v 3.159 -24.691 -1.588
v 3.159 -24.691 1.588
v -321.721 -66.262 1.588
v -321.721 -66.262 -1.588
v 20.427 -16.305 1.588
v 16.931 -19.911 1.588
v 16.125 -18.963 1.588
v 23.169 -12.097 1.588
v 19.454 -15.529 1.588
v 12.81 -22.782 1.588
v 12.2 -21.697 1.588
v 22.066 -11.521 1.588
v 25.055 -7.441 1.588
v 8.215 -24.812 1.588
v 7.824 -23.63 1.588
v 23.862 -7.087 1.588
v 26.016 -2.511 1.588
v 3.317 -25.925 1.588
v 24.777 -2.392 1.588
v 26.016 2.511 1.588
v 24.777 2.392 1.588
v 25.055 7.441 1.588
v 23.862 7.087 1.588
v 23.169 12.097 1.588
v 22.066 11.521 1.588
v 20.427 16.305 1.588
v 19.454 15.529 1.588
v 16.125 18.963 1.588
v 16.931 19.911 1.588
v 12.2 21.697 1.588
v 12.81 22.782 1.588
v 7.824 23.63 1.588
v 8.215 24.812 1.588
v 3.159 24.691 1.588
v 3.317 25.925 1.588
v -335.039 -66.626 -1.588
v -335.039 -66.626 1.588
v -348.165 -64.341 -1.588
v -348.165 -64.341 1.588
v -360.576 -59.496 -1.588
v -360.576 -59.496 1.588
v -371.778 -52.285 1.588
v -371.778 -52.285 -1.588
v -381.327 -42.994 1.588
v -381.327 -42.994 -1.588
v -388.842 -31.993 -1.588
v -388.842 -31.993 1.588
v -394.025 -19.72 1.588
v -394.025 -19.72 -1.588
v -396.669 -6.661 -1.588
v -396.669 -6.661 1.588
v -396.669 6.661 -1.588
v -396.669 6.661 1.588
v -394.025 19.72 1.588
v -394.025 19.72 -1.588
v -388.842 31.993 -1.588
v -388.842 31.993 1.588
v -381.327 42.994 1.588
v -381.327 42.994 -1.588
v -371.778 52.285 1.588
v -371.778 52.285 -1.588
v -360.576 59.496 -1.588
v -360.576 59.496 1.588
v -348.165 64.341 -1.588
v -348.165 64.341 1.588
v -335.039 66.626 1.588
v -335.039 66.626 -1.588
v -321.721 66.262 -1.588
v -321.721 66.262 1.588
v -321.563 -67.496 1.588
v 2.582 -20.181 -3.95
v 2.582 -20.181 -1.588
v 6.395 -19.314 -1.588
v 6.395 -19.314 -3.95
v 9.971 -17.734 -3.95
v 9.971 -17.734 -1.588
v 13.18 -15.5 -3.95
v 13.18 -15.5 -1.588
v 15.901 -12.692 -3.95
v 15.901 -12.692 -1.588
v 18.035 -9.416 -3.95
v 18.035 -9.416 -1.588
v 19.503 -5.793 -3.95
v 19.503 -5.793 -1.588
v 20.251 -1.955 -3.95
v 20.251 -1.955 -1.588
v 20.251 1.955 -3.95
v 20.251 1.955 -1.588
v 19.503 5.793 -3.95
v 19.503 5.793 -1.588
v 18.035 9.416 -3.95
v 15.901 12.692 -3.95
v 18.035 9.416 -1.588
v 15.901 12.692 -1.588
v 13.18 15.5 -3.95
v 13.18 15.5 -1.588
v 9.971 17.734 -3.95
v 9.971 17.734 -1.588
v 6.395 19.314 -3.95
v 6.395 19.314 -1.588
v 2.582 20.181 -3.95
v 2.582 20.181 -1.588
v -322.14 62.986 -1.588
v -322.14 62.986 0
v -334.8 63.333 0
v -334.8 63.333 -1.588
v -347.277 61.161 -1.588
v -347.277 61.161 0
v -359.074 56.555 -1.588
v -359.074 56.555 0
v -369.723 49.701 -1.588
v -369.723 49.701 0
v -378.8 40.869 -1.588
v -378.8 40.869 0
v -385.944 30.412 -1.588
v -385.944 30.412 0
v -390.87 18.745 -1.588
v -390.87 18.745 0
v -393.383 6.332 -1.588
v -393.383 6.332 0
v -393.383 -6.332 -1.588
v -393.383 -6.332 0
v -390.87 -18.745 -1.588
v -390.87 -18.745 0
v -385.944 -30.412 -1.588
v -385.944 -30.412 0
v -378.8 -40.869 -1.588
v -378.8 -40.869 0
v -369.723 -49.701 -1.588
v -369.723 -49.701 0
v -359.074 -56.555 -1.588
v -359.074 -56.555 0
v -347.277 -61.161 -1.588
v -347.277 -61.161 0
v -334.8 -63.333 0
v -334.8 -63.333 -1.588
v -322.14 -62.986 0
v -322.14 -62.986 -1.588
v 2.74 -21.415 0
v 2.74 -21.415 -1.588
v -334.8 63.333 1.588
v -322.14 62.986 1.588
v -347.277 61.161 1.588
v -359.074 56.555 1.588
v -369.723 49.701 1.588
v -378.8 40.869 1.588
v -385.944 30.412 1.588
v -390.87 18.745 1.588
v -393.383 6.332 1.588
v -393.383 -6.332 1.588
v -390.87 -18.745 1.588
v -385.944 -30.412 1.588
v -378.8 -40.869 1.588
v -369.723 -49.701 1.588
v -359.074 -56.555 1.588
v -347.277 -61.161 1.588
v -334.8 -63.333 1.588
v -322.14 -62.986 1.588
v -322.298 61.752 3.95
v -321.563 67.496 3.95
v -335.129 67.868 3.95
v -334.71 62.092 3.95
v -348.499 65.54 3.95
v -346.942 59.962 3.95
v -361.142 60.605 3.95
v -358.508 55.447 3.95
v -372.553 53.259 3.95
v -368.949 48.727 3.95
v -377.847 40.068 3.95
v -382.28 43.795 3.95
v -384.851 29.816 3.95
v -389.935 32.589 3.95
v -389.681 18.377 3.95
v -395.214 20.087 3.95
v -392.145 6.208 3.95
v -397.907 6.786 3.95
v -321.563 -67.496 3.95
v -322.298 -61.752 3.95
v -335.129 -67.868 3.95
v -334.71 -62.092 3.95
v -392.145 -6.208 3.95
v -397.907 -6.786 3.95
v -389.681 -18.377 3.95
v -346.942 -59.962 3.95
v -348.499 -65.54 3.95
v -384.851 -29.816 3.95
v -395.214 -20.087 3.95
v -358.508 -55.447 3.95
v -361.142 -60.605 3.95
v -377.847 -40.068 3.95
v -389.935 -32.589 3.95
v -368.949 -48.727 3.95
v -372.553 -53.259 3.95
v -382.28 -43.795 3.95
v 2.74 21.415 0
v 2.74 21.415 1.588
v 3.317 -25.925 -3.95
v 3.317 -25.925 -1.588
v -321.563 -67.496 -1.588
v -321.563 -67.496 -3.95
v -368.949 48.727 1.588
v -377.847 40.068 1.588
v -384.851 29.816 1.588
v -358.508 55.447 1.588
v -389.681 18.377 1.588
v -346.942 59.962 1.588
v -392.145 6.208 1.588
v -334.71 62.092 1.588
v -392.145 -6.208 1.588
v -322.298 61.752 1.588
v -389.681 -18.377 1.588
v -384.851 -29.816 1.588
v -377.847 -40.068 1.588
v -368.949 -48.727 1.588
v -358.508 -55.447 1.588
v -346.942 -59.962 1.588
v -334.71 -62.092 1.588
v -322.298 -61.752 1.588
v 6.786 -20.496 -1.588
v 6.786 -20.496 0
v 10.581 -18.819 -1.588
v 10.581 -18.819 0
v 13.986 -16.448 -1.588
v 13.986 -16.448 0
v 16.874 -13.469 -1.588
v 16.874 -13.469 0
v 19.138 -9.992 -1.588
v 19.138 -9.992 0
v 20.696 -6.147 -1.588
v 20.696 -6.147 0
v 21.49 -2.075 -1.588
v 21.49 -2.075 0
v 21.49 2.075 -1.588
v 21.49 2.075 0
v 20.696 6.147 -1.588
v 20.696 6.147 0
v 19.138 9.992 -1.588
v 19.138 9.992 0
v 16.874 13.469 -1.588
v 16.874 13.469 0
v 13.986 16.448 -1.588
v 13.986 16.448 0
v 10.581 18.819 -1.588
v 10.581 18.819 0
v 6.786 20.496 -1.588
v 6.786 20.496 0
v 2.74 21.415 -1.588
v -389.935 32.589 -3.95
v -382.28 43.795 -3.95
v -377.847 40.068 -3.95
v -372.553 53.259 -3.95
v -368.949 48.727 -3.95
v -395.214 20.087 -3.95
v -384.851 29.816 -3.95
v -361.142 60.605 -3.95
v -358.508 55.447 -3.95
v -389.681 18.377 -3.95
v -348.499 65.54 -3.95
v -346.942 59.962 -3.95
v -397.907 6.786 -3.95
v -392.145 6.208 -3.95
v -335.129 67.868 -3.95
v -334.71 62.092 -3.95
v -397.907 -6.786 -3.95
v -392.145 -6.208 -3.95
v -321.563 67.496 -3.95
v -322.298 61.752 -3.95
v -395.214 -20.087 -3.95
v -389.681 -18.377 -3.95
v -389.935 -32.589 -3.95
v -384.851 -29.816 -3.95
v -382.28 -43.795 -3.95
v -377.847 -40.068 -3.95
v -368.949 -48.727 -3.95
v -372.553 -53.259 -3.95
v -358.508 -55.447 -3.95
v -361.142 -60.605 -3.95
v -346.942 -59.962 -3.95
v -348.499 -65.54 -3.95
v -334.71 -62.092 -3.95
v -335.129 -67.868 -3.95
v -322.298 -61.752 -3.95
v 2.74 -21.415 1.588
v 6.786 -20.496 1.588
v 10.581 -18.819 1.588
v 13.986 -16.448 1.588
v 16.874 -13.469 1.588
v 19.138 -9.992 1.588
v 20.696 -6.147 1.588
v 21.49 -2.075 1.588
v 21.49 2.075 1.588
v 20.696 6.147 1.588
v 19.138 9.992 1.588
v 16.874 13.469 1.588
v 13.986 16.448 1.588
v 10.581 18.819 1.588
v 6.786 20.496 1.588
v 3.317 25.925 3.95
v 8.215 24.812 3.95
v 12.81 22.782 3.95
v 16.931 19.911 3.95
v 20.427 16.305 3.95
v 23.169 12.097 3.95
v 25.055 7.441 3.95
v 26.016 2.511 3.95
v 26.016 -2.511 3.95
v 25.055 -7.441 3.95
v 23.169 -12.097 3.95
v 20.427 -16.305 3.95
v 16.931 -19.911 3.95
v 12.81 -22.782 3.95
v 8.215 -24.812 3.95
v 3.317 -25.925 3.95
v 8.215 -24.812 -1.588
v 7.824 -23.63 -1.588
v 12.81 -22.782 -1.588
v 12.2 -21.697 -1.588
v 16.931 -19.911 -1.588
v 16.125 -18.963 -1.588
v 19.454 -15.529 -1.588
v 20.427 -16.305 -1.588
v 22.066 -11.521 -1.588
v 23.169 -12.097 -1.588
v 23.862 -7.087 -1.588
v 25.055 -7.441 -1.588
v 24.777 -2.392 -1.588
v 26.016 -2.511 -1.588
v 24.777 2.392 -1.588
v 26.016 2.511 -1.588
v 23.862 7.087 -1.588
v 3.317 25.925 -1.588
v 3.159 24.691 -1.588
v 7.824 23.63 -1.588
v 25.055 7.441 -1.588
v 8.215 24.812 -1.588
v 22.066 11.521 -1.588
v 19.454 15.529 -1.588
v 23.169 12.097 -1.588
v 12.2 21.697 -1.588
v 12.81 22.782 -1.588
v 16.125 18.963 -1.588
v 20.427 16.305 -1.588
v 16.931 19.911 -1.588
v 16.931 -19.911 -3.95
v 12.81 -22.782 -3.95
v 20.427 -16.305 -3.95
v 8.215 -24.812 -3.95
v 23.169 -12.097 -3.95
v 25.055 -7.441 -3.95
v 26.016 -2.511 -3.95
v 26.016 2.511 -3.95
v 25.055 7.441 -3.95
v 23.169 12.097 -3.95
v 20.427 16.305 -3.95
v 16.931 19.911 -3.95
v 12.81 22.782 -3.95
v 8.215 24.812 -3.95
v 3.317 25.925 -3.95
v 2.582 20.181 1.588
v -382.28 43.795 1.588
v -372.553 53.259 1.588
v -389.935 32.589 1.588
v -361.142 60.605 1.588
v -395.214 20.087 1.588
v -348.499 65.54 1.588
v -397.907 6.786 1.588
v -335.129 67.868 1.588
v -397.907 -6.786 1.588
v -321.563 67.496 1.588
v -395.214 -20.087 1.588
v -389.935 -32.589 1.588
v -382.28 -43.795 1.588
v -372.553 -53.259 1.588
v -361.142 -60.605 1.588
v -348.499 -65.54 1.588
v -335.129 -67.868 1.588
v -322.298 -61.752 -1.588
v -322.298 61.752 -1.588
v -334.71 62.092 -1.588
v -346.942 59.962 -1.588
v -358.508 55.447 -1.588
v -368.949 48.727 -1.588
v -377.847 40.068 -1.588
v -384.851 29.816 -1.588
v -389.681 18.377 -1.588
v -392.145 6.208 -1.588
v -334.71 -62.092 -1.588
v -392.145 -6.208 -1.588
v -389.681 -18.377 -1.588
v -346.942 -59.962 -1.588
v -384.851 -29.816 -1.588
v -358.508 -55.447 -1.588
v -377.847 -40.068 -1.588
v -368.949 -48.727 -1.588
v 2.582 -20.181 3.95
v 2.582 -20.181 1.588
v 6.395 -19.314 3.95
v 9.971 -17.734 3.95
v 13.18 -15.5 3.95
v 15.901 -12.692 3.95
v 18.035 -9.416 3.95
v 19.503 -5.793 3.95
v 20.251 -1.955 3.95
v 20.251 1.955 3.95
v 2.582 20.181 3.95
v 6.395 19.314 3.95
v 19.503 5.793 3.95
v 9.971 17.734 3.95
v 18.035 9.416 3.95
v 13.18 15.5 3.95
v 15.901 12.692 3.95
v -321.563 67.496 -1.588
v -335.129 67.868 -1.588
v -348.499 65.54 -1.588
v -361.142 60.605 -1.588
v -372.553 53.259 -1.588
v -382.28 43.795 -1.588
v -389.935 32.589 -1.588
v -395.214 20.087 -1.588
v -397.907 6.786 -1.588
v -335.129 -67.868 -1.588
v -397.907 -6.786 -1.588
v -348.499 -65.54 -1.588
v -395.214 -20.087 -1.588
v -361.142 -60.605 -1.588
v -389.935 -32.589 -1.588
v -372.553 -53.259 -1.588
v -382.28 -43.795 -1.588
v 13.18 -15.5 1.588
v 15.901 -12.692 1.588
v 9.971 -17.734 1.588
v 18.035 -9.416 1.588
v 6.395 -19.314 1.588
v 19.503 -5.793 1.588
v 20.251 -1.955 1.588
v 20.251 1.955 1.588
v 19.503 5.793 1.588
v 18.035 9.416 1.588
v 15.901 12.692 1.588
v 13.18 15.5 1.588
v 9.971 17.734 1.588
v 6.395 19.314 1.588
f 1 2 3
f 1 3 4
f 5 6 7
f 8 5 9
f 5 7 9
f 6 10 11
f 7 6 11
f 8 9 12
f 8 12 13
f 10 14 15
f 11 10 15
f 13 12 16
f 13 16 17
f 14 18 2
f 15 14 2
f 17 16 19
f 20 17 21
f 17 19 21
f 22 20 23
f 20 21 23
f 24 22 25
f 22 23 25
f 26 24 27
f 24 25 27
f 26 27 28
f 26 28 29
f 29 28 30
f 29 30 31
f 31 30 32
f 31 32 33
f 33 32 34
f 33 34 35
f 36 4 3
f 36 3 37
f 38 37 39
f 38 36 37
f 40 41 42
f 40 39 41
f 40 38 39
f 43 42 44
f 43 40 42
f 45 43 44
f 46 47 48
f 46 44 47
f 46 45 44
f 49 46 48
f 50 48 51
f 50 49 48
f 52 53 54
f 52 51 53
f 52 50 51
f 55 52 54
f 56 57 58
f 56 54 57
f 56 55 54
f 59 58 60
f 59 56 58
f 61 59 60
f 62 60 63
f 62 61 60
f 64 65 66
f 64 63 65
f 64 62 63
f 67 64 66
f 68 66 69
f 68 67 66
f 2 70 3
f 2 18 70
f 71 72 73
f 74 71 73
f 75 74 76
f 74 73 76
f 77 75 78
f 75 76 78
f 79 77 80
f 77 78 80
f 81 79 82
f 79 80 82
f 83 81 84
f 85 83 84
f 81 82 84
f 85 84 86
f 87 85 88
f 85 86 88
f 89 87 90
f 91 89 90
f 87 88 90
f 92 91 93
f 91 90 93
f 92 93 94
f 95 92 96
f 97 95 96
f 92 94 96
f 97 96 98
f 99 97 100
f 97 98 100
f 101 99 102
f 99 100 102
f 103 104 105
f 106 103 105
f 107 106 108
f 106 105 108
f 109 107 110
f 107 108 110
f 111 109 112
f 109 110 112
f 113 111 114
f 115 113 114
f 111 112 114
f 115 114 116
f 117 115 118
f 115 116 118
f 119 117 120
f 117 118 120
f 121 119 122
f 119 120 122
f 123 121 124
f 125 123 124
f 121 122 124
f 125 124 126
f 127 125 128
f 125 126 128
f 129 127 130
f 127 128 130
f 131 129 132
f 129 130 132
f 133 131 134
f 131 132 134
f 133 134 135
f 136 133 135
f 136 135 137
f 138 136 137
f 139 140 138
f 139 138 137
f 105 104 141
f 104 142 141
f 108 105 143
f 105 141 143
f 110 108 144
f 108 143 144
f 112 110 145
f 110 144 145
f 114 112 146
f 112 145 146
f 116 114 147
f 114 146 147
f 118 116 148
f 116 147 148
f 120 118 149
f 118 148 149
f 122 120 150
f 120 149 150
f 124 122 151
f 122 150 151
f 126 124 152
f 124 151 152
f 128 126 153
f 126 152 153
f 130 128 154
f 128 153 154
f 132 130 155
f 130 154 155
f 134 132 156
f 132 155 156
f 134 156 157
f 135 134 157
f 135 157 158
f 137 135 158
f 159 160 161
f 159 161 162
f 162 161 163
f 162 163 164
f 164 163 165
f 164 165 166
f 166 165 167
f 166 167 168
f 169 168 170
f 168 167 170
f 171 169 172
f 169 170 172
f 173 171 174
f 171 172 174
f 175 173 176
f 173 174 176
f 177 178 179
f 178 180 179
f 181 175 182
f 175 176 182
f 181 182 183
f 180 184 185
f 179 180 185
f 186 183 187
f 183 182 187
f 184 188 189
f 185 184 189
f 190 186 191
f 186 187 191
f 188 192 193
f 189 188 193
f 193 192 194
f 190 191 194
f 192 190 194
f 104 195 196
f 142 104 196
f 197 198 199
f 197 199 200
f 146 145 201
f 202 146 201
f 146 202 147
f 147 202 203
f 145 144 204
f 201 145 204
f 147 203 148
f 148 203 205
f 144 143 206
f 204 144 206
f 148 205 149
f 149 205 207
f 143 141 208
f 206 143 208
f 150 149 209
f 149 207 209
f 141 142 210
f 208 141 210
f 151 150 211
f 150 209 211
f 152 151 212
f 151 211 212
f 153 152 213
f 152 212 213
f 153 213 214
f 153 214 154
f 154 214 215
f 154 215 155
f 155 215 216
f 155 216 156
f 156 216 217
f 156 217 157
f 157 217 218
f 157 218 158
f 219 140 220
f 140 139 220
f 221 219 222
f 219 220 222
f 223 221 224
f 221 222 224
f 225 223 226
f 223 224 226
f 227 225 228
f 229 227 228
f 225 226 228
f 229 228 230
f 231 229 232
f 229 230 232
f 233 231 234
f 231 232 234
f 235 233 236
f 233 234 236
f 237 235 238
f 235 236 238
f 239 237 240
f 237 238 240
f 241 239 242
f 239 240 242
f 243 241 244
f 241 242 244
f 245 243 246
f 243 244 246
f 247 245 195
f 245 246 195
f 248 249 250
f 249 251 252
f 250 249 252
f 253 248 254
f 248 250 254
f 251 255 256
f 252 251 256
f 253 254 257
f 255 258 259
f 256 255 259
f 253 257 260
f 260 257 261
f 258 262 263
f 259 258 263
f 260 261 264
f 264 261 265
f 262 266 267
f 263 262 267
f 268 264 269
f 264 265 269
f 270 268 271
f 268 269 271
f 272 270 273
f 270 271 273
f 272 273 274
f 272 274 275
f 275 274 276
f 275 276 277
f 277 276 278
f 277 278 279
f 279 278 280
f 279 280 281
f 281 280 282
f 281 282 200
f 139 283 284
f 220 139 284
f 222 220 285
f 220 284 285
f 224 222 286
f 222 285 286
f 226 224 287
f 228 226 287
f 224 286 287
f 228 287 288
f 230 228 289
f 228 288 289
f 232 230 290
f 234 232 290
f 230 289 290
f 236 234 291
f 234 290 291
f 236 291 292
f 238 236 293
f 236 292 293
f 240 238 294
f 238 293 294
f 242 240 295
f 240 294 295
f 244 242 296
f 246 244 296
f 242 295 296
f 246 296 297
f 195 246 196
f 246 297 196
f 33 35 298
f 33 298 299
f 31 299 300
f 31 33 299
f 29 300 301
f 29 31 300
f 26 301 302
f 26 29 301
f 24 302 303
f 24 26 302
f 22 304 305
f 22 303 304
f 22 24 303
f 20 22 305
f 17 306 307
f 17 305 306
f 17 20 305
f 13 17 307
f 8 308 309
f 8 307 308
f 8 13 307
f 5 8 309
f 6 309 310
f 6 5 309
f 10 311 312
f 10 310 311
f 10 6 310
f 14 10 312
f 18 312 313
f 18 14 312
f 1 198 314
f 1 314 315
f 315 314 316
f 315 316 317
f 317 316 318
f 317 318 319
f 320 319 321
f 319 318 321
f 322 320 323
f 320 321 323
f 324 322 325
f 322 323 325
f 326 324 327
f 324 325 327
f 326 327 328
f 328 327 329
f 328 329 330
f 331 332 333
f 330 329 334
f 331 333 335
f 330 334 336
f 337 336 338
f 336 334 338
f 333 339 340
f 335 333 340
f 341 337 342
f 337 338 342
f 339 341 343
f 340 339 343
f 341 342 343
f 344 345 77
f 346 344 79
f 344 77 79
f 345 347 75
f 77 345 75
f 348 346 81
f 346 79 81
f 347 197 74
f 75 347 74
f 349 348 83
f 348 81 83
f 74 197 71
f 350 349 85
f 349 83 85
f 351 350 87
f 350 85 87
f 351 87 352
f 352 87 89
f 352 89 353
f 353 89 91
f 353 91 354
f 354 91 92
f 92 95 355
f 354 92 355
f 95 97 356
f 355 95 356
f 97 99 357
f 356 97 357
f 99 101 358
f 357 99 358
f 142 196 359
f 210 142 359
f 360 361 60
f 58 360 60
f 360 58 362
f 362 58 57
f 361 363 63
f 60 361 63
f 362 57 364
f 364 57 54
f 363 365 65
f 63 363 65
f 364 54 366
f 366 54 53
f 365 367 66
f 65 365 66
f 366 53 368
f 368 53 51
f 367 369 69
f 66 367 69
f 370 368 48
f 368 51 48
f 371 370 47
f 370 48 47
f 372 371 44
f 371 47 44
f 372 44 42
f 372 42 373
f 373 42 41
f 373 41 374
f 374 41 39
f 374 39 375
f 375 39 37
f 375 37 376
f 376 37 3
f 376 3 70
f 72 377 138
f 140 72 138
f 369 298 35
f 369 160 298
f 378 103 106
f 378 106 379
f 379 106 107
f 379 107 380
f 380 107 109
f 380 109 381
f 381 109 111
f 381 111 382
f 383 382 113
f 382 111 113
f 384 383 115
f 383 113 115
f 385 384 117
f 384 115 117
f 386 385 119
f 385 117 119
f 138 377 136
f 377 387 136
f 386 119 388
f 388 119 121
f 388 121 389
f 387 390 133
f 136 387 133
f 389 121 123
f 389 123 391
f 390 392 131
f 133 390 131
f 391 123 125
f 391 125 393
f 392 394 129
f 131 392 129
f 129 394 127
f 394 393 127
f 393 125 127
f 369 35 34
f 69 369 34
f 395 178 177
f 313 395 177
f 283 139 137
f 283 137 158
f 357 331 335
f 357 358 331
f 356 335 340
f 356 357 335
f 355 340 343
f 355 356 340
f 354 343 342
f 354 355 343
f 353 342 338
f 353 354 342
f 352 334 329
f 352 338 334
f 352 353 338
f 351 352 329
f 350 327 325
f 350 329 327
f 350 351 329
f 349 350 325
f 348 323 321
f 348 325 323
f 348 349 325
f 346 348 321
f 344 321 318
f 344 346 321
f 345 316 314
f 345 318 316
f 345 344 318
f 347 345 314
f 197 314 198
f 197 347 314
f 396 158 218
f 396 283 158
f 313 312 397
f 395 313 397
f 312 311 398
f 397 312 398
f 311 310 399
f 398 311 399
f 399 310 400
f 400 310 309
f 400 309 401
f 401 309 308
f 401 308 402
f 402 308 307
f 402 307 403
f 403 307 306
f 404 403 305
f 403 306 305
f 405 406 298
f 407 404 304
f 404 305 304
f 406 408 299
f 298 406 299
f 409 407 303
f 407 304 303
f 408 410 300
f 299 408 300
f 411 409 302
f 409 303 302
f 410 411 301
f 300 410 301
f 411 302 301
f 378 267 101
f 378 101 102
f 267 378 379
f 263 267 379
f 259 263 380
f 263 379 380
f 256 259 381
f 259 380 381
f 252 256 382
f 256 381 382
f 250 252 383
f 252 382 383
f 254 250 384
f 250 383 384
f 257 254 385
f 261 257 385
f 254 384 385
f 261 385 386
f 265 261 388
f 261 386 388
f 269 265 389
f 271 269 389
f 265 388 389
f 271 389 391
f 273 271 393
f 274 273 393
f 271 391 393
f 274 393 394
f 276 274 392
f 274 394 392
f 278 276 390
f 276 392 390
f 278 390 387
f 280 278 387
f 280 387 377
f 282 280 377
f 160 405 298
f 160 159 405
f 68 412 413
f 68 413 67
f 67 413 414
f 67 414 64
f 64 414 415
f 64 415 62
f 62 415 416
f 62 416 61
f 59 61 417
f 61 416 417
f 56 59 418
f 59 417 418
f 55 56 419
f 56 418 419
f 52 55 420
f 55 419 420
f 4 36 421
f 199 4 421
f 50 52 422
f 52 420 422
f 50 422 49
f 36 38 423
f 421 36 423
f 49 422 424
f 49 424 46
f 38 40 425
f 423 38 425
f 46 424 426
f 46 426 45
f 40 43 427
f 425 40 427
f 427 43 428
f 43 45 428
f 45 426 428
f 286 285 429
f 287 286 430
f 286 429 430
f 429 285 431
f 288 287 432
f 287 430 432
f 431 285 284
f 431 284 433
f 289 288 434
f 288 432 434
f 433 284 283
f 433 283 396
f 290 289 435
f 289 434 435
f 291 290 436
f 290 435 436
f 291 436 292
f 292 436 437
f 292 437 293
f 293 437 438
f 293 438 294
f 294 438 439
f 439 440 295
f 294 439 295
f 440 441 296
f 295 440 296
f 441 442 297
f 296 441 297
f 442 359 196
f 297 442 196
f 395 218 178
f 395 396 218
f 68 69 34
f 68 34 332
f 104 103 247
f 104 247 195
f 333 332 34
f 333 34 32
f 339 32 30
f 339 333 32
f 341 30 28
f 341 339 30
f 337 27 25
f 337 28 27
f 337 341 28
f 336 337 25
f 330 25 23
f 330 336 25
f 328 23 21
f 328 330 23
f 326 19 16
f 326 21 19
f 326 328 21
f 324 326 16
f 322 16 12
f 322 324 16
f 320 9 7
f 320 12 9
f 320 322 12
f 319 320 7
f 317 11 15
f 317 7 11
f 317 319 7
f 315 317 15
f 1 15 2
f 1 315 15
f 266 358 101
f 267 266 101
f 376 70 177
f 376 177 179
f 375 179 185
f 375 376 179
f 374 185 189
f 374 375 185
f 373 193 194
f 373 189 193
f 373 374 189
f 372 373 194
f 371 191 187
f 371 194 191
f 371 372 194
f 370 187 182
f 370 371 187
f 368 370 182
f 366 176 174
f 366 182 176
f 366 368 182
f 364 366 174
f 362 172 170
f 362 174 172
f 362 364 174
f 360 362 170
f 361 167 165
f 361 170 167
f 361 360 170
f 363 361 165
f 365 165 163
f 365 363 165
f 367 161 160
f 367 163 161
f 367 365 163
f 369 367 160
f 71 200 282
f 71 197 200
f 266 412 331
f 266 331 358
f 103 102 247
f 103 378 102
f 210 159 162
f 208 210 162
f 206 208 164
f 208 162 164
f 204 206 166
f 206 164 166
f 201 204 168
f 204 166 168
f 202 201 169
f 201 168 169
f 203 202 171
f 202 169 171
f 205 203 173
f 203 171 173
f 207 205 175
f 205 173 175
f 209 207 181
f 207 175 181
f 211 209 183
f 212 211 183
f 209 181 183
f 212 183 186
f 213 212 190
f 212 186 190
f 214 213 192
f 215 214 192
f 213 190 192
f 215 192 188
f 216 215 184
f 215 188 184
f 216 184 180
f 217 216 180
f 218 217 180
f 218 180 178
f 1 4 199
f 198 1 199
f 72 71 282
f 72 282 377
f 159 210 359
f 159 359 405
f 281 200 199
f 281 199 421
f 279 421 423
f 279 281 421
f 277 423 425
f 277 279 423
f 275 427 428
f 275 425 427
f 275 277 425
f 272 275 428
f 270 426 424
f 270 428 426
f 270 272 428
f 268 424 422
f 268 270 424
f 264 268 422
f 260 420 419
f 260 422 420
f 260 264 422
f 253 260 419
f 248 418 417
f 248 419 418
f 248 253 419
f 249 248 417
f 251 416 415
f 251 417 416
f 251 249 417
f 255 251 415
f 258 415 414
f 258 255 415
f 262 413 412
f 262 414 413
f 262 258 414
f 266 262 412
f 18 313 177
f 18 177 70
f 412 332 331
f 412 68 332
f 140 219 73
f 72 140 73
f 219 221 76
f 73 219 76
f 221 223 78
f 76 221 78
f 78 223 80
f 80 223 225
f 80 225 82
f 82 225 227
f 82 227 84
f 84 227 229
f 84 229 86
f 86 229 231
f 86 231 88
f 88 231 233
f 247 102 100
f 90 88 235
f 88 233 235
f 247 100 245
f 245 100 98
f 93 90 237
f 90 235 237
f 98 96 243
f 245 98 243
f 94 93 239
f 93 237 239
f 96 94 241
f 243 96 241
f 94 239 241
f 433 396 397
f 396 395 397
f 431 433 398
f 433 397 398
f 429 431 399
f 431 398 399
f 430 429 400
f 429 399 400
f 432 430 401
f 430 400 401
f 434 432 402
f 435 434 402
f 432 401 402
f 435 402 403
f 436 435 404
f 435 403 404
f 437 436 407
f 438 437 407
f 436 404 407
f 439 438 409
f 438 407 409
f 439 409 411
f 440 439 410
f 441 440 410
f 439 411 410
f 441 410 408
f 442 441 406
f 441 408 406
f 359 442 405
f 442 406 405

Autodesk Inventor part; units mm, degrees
ref_plane "YZ Plane" through (0, 0, 0) normal (1, 0, 0) x (0, 1, 0)
ref_plane "XZ Plane" through (0, 0, 0) normal (0, 1, 0) x (-1, 0, 0)
ref_plane "XY Plane" through (0, 0, 0) normal (0, 0, 1) x (1, 0, 0)
sketch "Sketch2" plane through (0, 0, 0) normal (0, 0, 1) x (1, 0, 0)
  arc A0 (2.7403, -21.4154) -> (2.7403, 21.4154) centre (0, 0) ccw
  arc A1 (-322.1404, 62.9864) -> (-322.1404, -62.9864) centre (-330.2, 0) ccw
  line L0 (-322.1404, 62.9864) -> (2.7403, 21.4154)
  line L1 (2.7403, -21.4154) -> (-322.1404, -62.9864)
  dimension "d1" = 330.2
  dimension "d3" = 43.18
  dimension "d4" = 127
sketch "Sketch3" plane through (0, 0, 0) normal (0, 1, 0) x (-1, 0, 0)
  line L0 (-2.7403, 0) -> (-21.59, 0) projected
  line L1 (-26.1366, 3.9497) -> (-20.3454, 3.9497)
  line L2 (-20.3454, 3.9497) -> (-20.3454, 1.5875)
  line L3 (-20.3454, 1.5875) -> (-21.59, 1.5875)
  line L4 (-21.59, 1.5875) -> (-21.59, -1.5875)
  line L5 (-21.59, -1.5875) -> (-20.3454, -1.5875)
  line L6 (-20.3454, -1.5875) -> (-20.3454, -3.9497)
  line L7 (-20.3454, -3.9497) -> (-26.1366, -3.9497)
  line L8 (-26.1366, -3.9497) -> (-26.1366, -1.5875)
  line L9 (-26.1366, -1.5875) -> (-24.892, -1.5875)
  line L10 (-24.892, -1.5875) -> (-24.892, 1.5875)
  line L11 (-24.892, 1.5875) -> (-26.1366, 1.5875)
  line L12 (-26.1366, 3.9497) -> (-26.1366, 1.5875)
  point P0 (0, 0)
  point P1 (-24.892, 0)
  dimension "d8" = 5.7912
  dimension "d9" = 7.8994
  dimension "d10" = 3.175
  dimension "d11" = 3.302
sweep "Sweep1" add profiles "Sketch3" path "Sketch2"
properties part number "IntakeChain" material "Steel"
